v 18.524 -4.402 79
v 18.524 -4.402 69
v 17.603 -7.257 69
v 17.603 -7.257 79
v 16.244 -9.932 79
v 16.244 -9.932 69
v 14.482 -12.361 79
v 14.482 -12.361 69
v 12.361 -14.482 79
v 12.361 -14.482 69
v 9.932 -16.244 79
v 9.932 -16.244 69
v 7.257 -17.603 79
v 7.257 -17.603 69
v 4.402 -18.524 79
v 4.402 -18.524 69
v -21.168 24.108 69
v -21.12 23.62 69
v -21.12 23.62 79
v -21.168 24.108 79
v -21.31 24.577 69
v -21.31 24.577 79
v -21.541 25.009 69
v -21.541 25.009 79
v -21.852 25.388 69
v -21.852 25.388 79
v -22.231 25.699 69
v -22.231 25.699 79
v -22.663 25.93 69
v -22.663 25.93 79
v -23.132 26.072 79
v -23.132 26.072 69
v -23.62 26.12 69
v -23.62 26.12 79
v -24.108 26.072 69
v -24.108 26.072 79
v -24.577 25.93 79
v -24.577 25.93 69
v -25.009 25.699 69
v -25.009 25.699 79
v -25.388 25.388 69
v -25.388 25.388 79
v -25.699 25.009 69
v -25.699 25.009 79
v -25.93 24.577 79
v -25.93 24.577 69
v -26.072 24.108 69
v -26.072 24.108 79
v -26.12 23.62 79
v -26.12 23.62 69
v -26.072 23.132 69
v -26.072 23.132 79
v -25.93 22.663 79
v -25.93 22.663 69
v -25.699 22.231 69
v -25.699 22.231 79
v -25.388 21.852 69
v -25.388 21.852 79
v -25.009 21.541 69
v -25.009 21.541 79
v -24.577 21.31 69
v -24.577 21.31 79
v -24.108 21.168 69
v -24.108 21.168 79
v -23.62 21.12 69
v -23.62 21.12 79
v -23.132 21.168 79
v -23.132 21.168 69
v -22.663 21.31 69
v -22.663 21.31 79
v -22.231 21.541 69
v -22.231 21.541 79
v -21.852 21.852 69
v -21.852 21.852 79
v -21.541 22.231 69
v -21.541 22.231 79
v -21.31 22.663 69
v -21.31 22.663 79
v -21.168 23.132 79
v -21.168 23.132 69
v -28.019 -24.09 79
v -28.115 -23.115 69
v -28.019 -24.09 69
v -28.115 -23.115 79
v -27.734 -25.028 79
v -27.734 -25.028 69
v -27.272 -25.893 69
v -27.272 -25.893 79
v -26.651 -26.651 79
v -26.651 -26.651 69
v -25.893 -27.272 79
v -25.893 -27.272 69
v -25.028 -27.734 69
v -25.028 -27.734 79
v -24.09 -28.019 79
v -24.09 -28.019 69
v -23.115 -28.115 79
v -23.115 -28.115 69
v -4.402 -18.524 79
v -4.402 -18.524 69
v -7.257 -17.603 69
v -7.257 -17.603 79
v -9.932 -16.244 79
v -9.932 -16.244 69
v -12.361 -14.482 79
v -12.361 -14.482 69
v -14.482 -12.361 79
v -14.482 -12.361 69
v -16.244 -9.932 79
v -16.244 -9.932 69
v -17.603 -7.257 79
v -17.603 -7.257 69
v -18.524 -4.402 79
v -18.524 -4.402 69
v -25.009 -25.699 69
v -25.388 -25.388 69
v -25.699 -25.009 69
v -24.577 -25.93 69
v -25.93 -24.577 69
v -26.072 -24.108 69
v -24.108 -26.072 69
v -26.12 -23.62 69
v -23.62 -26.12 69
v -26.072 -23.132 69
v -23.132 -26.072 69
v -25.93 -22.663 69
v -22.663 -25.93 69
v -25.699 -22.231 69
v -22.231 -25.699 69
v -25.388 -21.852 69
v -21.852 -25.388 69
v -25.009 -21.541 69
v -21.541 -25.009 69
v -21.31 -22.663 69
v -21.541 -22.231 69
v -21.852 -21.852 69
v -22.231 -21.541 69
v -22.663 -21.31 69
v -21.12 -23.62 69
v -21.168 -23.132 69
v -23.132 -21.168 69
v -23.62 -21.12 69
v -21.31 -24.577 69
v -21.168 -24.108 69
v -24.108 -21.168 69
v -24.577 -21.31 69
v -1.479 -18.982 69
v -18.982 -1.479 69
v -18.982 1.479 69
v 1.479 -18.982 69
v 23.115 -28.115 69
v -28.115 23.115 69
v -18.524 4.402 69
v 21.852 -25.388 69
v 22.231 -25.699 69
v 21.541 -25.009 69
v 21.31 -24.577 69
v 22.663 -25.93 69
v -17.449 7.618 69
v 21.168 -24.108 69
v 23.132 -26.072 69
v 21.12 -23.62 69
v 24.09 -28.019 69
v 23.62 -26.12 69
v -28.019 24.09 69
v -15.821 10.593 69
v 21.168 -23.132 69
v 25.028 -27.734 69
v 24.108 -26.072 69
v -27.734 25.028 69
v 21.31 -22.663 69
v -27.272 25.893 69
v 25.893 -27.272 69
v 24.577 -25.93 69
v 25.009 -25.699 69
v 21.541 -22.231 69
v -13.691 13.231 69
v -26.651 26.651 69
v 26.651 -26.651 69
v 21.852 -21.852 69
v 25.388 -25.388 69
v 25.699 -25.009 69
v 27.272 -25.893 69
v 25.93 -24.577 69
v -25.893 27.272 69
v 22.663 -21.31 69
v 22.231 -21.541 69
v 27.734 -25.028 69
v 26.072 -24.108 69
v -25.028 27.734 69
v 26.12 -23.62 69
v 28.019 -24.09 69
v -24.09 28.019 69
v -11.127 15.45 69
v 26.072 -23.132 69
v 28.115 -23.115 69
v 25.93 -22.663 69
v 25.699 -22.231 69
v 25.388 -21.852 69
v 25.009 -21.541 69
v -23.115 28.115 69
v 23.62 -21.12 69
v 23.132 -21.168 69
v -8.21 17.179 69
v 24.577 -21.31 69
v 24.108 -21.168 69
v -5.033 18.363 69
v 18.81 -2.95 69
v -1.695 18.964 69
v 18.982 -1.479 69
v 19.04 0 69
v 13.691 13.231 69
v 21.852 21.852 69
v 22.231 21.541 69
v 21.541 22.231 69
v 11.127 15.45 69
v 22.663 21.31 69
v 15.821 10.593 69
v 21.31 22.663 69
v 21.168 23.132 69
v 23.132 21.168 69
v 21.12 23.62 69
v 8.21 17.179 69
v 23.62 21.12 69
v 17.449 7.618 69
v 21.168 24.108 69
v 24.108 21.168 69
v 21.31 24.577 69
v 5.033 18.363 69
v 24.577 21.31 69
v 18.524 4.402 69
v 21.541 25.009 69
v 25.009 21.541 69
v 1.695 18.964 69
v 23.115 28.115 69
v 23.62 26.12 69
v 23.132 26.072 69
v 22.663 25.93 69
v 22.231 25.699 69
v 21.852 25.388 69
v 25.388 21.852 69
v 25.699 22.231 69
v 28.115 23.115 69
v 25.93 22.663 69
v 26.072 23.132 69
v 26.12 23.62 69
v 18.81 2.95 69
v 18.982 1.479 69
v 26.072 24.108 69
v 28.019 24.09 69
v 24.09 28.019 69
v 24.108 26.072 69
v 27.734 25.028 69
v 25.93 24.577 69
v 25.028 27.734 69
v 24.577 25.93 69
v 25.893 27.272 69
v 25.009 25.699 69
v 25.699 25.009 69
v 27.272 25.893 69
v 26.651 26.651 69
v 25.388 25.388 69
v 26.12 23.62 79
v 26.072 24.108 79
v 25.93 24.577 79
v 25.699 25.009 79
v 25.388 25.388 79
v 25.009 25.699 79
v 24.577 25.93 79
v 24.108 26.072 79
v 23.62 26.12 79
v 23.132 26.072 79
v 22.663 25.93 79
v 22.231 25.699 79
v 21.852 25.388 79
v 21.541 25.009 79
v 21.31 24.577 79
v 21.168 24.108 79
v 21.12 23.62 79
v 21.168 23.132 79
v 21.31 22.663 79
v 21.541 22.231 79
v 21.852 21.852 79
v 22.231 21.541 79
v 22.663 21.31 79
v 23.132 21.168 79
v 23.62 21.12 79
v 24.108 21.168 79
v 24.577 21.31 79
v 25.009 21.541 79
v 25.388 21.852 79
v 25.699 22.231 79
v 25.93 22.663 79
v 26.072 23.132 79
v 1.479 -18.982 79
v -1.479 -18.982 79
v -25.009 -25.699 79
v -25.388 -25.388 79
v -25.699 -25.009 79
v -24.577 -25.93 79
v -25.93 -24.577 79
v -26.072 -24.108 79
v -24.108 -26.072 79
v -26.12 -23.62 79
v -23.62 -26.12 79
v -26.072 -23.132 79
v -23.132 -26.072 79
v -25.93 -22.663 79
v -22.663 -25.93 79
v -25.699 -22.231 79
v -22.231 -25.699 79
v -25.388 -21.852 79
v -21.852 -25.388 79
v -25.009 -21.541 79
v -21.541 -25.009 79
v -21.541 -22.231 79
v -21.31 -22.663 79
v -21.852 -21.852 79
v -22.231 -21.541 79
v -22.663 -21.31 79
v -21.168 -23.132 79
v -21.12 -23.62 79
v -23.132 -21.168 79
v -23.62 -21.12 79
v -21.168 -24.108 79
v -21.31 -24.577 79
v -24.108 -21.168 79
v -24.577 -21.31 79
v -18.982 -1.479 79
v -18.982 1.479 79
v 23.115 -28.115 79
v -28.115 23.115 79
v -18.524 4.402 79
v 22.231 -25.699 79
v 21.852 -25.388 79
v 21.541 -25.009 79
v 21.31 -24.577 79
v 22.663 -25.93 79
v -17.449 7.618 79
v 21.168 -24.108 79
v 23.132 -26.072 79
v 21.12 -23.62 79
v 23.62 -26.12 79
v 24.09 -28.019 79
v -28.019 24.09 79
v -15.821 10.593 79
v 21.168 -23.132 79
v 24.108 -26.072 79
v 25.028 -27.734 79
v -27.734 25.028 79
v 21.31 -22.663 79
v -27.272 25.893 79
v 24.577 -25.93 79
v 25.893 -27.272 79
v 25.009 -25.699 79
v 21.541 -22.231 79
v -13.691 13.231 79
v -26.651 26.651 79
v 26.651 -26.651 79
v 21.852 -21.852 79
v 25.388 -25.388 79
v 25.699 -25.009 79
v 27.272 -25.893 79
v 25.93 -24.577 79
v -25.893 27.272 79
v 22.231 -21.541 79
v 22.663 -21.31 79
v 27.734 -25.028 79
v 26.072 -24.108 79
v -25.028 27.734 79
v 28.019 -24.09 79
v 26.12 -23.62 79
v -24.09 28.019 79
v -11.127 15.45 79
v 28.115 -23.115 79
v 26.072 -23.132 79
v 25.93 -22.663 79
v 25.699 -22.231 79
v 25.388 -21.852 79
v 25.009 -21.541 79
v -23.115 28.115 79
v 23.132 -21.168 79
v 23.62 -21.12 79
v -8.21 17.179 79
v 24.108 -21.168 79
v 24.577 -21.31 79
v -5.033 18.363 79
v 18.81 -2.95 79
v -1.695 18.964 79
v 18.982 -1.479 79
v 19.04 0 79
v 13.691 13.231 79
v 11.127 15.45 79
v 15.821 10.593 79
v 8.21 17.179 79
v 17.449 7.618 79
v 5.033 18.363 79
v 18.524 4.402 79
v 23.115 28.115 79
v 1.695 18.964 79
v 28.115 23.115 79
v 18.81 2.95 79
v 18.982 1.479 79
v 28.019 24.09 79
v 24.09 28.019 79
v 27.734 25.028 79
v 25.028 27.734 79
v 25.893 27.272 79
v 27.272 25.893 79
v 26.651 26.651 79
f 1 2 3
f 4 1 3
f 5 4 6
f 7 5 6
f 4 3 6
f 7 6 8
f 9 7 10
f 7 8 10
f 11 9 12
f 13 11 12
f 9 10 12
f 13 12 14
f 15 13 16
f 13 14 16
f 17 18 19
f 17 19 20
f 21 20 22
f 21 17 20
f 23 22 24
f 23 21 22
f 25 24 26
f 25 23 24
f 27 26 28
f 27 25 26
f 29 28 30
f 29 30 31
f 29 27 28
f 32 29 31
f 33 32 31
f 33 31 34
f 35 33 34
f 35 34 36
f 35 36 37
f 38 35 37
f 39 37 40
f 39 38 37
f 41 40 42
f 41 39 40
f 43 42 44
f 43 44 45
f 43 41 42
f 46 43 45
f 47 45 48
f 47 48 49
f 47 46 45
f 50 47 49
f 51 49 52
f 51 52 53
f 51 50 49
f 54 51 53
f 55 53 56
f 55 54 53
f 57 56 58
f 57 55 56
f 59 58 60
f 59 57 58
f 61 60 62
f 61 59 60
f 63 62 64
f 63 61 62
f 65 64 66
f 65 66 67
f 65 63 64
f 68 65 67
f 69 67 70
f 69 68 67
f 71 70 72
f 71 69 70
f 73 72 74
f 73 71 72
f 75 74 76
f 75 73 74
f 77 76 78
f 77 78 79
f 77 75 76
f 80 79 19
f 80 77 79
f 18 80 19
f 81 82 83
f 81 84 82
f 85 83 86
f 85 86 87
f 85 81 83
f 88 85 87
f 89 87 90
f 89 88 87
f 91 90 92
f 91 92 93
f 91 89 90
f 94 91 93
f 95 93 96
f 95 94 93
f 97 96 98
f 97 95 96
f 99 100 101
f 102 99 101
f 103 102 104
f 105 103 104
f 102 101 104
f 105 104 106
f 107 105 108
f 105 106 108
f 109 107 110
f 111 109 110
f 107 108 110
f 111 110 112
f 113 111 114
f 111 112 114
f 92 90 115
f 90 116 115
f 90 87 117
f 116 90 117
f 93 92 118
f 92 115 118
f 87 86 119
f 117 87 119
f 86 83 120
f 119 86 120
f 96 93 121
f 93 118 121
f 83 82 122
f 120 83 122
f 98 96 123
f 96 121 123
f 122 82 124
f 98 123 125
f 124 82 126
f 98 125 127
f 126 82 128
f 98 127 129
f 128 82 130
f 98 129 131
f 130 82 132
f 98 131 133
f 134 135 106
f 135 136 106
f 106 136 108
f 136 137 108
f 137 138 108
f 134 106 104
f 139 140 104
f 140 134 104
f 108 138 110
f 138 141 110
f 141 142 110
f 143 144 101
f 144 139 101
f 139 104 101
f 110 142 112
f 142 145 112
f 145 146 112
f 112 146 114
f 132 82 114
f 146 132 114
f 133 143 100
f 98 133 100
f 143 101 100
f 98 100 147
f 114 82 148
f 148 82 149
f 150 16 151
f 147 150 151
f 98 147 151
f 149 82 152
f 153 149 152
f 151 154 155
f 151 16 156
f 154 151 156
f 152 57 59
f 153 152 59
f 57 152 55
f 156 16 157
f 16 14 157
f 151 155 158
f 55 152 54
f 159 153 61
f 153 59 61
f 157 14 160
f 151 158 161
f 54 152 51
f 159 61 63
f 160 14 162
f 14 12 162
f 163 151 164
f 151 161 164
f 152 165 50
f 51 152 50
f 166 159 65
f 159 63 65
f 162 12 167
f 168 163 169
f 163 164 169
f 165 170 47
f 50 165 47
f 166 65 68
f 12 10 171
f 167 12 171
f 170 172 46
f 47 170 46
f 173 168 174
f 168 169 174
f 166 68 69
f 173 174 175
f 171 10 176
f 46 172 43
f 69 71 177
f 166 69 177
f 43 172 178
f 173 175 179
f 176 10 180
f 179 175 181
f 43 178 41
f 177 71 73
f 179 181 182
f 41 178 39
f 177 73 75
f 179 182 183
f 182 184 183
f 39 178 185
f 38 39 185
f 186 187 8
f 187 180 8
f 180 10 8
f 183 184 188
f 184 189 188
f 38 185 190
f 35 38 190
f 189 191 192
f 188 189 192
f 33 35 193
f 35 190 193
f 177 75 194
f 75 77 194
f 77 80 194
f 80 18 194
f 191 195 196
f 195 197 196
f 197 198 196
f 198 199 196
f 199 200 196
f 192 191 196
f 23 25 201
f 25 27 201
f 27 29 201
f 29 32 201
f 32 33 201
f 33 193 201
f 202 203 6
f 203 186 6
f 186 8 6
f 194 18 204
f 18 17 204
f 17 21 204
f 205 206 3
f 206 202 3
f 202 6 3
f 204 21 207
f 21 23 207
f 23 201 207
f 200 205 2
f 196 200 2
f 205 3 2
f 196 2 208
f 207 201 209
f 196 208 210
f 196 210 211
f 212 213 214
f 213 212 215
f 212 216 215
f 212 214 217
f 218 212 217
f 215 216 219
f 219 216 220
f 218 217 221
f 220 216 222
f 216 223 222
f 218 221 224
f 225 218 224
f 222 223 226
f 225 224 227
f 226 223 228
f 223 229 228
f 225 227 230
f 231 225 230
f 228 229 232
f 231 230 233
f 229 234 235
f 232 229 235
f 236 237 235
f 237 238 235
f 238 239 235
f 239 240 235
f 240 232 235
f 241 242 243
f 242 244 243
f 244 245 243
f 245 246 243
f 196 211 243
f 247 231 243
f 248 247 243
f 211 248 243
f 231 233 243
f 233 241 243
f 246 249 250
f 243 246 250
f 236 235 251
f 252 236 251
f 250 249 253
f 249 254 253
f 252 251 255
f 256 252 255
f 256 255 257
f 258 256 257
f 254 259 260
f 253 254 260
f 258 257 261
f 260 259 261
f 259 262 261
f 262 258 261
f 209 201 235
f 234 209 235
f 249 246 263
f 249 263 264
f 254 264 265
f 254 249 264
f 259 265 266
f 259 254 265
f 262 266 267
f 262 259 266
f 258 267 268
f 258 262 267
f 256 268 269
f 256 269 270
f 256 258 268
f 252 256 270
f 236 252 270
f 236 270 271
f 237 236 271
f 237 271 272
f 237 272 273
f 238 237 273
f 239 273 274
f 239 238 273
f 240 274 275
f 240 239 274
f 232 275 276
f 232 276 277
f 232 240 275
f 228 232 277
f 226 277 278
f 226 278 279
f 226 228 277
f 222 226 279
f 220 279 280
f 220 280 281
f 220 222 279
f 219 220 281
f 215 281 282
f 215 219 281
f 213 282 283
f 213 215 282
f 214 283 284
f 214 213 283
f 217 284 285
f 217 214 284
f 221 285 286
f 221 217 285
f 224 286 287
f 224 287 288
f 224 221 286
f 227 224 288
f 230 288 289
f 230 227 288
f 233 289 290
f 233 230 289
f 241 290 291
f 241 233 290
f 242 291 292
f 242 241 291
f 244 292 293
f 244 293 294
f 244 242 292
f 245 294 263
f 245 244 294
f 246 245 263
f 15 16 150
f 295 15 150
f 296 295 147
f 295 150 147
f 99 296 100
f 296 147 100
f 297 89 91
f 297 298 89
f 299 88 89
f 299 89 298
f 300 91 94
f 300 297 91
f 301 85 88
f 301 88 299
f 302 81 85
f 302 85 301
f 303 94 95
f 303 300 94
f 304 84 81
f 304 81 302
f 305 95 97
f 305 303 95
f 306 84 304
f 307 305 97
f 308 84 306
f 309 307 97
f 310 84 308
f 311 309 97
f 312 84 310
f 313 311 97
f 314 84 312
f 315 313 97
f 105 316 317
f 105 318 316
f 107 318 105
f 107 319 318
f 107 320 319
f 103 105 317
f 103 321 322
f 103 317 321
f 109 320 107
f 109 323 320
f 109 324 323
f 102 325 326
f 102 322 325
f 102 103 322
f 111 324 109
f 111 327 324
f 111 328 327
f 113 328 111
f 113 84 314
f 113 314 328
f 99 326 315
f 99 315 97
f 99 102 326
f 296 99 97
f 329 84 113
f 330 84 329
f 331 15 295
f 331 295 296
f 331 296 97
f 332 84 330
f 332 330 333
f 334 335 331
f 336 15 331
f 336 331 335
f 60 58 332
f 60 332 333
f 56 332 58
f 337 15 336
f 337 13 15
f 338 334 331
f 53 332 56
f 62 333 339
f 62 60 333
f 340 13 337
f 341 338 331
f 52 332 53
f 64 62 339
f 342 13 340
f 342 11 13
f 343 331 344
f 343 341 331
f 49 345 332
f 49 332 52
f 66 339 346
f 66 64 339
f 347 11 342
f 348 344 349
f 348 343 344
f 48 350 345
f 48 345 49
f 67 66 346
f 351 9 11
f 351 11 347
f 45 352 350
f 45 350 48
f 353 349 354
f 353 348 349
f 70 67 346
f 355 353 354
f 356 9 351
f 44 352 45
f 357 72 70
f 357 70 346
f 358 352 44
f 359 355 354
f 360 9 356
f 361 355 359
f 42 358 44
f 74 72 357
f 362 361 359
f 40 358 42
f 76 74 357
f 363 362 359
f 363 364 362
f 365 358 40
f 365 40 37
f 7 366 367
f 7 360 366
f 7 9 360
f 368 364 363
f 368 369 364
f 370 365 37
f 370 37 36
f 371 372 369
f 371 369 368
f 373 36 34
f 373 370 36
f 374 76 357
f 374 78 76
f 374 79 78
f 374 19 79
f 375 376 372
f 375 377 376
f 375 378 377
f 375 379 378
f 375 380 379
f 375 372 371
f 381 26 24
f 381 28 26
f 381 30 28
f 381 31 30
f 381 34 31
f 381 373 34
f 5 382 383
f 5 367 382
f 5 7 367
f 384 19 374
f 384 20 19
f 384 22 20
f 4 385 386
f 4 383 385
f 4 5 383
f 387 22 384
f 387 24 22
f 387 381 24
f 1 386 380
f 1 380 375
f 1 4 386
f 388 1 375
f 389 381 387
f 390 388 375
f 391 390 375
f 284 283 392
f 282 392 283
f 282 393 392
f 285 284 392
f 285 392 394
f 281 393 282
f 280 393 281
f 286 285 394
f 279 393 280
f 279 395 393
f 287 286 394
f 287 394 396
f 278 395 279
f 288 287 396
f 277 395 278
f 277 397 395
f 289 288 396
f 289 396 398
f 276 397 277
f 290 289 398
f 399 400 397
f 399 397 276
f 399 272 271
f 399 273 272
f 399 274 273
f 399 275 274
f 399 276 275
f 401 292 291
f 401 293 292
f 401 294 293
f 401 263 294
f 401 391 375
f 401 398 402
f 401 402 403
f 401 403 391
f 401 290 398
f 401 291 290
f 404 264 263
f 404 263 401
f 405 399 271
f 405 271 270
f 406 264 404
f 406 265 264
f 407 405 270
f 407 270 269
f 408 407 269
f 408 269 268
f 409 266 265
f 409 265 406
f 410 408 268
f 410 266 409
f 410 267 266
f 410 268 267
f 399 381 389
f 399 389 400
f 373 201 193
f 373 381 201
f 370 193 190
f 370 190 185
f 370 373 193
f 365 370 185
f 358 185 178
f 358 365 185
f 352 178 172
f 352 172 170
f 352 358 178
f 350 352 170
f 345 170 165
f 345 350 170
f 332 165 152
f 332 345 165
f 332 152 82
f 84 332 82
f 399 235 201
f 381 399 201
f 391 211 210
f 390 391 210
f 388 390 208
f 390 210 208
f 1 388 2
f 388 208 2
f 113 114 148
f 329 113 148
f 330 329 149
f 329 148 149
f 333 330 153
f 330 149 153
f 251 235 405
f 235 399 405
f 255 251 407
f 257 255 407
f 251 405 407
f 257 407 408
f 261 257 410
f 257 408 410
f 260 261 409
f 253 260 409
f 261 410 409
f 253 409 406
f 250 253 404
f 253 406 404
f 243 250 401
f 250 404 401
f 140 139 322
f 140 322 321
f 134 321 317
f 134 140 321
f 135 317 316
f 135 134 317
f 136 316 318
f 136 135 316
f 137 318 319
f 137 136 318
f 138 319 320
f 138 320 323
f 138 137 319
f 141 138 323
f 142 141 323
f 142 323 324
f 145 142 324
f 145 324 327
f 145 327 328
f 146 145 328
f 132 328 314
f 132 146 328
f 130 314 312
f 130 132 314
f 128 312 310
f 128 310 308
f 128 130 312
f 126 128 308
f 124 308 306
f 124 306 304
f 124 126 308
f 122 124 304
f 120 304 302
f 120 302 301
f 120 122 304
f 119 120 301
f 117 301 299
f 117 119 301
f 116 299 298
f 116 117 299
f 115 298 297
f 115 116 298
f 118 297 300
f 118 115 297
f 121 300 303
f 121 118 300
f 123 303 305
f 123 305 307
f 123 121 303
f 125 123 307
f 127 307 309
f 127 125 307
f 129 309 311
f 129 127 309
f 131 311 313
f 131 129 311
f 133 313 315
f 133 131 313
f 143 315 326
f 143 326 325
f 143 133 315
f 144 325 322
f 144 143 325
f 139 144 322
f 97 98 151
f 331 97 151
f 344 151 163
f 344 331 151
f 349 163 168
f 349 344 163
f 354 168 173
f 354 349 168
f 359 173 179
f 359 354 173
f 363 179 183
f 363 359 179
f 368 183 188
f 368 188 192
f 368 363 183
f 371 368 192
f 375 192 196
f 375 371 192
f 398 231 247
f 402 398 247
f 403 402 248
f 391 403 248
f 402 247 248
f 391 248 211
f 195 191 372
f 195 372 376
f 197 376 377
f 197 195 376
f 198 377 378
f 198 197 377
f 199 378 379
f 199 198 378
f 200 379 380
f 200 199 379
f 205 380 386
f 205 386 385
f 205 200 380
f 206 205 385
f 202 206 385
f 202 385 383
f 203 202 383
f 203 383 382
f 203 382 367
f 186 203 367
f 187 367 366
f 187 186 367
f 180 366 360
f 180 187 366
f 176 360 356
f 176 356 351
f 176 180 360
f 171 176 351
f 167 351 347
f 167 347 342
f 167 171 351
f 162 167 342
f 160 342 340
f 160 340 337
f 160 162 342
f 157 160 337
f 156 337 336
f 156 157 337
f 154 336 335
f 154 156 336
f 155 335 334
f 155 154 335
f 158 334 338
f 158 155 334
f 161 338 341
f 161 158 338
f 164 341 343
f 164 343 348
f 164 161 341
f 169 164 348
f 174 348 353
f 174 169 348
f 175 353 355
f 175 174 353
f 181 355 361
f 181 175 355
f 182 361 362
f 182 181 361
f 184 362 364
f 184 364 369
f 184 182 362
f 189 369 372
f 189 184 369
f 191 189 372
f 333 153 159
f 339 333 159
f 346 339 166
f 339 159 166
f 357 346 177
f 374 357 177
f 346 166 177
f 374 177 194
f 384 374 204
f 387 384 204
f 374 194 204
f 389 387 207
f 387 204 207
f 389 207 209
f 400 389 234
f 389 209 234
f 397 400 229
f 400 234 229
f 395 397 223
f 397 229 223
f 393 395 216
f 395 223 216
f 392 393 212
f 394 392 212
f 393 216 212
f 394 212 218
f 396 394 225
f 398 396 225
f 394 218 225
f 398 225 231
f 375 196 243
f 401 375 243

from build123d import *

# Parameters (mm, degrees)
F1_START = 69
F0_R     = 2.5
F1_DEPTH = 10
F2_R     = 5


with BuildPart() as f1:
    # F0 (on Top) → F1 (new body)
    with BuildSketch(Plane.XY.offset(F1_START)):
        with BuildLine():
            Line((28.115, 28.115), (-28.115, 28.115))
            Line((-28.115, 28.115), (-28.115, 7.6560907126))
            ThreePointArc((-28.115, 7.6560907126), (-22.7514332101, 7.7037324483), (-18.5240804258, 4.4022771811))
            ThreePointArc((-18.5240804258, 4.4022771811), (0, 19.04), (18.5240804258, 4.4022771811))
            ThreePointArc((18.5240804258, 4.4022771811), (22.7514332101, 7.7037324483), (28.115, 7.6560907126))
            Line((28.115, 7.6560907126), (28.115, 28.115))
        make_face()
        with Locations((-23.62, 23.62)):
            Circle(F0_R, mode=Mode.SUBTRACT)
        with Locations((23.62, 23.62)):
            Circle(F0_R, mode=Mode.SUBTRACT)
        with BuildLine():
            ThreePointArc((-18.5240804258, 4.4022771811), (-22.7514332101, 7.7037324483), (-28.115, 7.6560907126))
            Line((-28.115, 7.6560907126), (-28.115, 2.0247777656))
            ThreePointArc((-28.115, 2.0247777656), (-24.2994074418, 3.2444934119), (-21.95, 0))
            ThreePointArc((-21.95, 0), (-24.2994074418, -3.2444934119), (-28.115, -2.0247777656))
            Line((-28.115, -2.0247777656), (-28.115, -7.6560907126))
            ThreePointArc((-28.115, -7.6560907126), (-22.7514332101, -7.7037324483), (-18.5240804258, -4.4022771811))
            ThreePointArc((-18.5240804258, -4.4022771811), (-19.04, 0), (-18.5240804258, 4.4022771811))
        make_face()
        with BuildLine():
            ThreePointArc((-21.95, 0), (-24.2994074418, 3.2444934119), (-28.115, 2.0247777656))
            Line((-28.115, 2.0247777656), (-28.115, -2.0247777656))
            ThreePointArc((-28.115, -2.0247777656), (-24.2994074418, -3.2444934119), (-21.95, 0))
        make_face()
        with BuildLine():
            ThreePointArc((-18.5240804258, -4.4022771811), (-22.7514332101, -7.7037324483), (-28.115, -7.6560907126))
            Line((-28.115, -7.6560907126), (-28.115, -28.115))
            Line((-28.115, -28.115), (-7.6560907126, -28.115))
            ThreePointArc((-7.6560907126, -28.115), (-7.7037324483, -22.7514332101), (-4.4022771811, -18.5240804258))
            ThreePointArc((-4.4022771811, -18.5240804258), (-13.4633131138, -13.4633131138), (-18.5240804258, -4.4022771811))
        make_face()
        with Locations((-23.62, -23.62)):
            Circle(F0_R, mode=Mode.SUBTRACT)
        with BuildLine():
            ThreePointArc((4.4022771811, -18.5240804258), (0, -19.04), (-4.4022771811, -18.5240804258))
            ThreePointArc((-4.4022771811, -18.5240804258), (-7.7037324483, -22.7514332101), (-7.6560907126, -28.115))
            Line((-7.6560907126, -28.115), (-2.0247777656, -28.115))
            ThreePointArc((-2.0247777656, -28.115), (-1.5407155692, -22.3173089831), (3.415, -25.365))
            ThreePointArc((3.415, -25.365), (3.0476910169, -26.9057155692), (2.0247777656, -28.115))
            Line((2.0247777656, -28.115), (7.6560907126, -28.115))
            ThreePointArc((7.6560907126, -28.115), (8.0143784209, -26.7606946394), (8.135, -25.365))
            ThreePointArc((8.135, -25.365), (7.1411046018, -21.4684823155), (4.4022771811, -18.5240804258))
        make_face()
        with BuildLine():
            ThreePointArc((3.415, -25.365), (-1.5407155692, -22.3173089831), (-2.0247777656, -28.115))
            Line((-2.0247777656, -28.115), (2.0247777656, -28.115))
            ThreePointArc((2.0247777656, -28.115), (3.0476910169, -26.9057155692), (3.415, -25.365))
        make_face()
        with BuildLine():
            Line((28.115, -28.115), (28.115, -7.6560907126))
            ThreePointArc((28.115, -7.6560907126), (22.7514332101, -7.7037324483), (18.5240804258, -4.4022771811))
            ThreePointArc((18.5240804258, -4.4022771811), (13.4633131138, -13.4633131138), (4.4022771811, -18.5240804258))
            ThreePointArc((4.4022771811, -18.5240804258), (7.1411046018, -21.4684823155), (8.135, -25.365))
            ThreePointArc((8.135, -25.365), (8.0143784209, -26.7606946394), (7.6560907126, -28.115))
            Line((7.6560907126, -28.115), (28.115, -28.115))
        make_face()
        with Locations((23.62, -23.62)):
            Circle(F0_R, mode=Mode.SUBTRACT)
        with BuildLine():
            Line((28.115, 2.0247777656), (28.115, 7.6560907126))
            ThreePointArc((28.115, 7.6560907126), (22.7514332101, 7.7037324483), (18.5240804258, 4.4022771811))
            ThreePointArc((18.5240804258, 4.4022771811), (18.9105802569, 2.2162026862), (19.04, 0))
            ThreePointArc((19.04, 0), (18.9105802569, -2.2162026862), (18.5240804258, -4.4022771811))
            ThreePointArc((18.5240804258, -4.4022771811), (22.7514332101, -7.7037324483), (28.115, -7.6560907126))
            Line((28.115, -7.6560907126), (28.115, -2.0247777656))
            ThreePointArc((28.115, -2.0247777656), (21.95, 0), (28.115, 2.0247777656))
        make_face()
        with BuildLine():
            Line((28.115, -2.0247777656), (28.115, 2.0247777656))
            ThreePointArc((28.115, 2.0247777656), (21.95, 0), (28.115, -2.0247777656))
        make_face()
    extrude(amount=F1_DEPTH)

    # F2
    f2_edges = [f1.edges().sort_by_distance(p)[0] for p in [
        (-28.115, -28.115, 74),
        (-28.115, 28.115, 74),
        (28.115, 28.115, 74),
        (28.115, -28.115, 74),
    ]]
    fillet(f2_edges, radius=F2_R)


solid = f1.part
